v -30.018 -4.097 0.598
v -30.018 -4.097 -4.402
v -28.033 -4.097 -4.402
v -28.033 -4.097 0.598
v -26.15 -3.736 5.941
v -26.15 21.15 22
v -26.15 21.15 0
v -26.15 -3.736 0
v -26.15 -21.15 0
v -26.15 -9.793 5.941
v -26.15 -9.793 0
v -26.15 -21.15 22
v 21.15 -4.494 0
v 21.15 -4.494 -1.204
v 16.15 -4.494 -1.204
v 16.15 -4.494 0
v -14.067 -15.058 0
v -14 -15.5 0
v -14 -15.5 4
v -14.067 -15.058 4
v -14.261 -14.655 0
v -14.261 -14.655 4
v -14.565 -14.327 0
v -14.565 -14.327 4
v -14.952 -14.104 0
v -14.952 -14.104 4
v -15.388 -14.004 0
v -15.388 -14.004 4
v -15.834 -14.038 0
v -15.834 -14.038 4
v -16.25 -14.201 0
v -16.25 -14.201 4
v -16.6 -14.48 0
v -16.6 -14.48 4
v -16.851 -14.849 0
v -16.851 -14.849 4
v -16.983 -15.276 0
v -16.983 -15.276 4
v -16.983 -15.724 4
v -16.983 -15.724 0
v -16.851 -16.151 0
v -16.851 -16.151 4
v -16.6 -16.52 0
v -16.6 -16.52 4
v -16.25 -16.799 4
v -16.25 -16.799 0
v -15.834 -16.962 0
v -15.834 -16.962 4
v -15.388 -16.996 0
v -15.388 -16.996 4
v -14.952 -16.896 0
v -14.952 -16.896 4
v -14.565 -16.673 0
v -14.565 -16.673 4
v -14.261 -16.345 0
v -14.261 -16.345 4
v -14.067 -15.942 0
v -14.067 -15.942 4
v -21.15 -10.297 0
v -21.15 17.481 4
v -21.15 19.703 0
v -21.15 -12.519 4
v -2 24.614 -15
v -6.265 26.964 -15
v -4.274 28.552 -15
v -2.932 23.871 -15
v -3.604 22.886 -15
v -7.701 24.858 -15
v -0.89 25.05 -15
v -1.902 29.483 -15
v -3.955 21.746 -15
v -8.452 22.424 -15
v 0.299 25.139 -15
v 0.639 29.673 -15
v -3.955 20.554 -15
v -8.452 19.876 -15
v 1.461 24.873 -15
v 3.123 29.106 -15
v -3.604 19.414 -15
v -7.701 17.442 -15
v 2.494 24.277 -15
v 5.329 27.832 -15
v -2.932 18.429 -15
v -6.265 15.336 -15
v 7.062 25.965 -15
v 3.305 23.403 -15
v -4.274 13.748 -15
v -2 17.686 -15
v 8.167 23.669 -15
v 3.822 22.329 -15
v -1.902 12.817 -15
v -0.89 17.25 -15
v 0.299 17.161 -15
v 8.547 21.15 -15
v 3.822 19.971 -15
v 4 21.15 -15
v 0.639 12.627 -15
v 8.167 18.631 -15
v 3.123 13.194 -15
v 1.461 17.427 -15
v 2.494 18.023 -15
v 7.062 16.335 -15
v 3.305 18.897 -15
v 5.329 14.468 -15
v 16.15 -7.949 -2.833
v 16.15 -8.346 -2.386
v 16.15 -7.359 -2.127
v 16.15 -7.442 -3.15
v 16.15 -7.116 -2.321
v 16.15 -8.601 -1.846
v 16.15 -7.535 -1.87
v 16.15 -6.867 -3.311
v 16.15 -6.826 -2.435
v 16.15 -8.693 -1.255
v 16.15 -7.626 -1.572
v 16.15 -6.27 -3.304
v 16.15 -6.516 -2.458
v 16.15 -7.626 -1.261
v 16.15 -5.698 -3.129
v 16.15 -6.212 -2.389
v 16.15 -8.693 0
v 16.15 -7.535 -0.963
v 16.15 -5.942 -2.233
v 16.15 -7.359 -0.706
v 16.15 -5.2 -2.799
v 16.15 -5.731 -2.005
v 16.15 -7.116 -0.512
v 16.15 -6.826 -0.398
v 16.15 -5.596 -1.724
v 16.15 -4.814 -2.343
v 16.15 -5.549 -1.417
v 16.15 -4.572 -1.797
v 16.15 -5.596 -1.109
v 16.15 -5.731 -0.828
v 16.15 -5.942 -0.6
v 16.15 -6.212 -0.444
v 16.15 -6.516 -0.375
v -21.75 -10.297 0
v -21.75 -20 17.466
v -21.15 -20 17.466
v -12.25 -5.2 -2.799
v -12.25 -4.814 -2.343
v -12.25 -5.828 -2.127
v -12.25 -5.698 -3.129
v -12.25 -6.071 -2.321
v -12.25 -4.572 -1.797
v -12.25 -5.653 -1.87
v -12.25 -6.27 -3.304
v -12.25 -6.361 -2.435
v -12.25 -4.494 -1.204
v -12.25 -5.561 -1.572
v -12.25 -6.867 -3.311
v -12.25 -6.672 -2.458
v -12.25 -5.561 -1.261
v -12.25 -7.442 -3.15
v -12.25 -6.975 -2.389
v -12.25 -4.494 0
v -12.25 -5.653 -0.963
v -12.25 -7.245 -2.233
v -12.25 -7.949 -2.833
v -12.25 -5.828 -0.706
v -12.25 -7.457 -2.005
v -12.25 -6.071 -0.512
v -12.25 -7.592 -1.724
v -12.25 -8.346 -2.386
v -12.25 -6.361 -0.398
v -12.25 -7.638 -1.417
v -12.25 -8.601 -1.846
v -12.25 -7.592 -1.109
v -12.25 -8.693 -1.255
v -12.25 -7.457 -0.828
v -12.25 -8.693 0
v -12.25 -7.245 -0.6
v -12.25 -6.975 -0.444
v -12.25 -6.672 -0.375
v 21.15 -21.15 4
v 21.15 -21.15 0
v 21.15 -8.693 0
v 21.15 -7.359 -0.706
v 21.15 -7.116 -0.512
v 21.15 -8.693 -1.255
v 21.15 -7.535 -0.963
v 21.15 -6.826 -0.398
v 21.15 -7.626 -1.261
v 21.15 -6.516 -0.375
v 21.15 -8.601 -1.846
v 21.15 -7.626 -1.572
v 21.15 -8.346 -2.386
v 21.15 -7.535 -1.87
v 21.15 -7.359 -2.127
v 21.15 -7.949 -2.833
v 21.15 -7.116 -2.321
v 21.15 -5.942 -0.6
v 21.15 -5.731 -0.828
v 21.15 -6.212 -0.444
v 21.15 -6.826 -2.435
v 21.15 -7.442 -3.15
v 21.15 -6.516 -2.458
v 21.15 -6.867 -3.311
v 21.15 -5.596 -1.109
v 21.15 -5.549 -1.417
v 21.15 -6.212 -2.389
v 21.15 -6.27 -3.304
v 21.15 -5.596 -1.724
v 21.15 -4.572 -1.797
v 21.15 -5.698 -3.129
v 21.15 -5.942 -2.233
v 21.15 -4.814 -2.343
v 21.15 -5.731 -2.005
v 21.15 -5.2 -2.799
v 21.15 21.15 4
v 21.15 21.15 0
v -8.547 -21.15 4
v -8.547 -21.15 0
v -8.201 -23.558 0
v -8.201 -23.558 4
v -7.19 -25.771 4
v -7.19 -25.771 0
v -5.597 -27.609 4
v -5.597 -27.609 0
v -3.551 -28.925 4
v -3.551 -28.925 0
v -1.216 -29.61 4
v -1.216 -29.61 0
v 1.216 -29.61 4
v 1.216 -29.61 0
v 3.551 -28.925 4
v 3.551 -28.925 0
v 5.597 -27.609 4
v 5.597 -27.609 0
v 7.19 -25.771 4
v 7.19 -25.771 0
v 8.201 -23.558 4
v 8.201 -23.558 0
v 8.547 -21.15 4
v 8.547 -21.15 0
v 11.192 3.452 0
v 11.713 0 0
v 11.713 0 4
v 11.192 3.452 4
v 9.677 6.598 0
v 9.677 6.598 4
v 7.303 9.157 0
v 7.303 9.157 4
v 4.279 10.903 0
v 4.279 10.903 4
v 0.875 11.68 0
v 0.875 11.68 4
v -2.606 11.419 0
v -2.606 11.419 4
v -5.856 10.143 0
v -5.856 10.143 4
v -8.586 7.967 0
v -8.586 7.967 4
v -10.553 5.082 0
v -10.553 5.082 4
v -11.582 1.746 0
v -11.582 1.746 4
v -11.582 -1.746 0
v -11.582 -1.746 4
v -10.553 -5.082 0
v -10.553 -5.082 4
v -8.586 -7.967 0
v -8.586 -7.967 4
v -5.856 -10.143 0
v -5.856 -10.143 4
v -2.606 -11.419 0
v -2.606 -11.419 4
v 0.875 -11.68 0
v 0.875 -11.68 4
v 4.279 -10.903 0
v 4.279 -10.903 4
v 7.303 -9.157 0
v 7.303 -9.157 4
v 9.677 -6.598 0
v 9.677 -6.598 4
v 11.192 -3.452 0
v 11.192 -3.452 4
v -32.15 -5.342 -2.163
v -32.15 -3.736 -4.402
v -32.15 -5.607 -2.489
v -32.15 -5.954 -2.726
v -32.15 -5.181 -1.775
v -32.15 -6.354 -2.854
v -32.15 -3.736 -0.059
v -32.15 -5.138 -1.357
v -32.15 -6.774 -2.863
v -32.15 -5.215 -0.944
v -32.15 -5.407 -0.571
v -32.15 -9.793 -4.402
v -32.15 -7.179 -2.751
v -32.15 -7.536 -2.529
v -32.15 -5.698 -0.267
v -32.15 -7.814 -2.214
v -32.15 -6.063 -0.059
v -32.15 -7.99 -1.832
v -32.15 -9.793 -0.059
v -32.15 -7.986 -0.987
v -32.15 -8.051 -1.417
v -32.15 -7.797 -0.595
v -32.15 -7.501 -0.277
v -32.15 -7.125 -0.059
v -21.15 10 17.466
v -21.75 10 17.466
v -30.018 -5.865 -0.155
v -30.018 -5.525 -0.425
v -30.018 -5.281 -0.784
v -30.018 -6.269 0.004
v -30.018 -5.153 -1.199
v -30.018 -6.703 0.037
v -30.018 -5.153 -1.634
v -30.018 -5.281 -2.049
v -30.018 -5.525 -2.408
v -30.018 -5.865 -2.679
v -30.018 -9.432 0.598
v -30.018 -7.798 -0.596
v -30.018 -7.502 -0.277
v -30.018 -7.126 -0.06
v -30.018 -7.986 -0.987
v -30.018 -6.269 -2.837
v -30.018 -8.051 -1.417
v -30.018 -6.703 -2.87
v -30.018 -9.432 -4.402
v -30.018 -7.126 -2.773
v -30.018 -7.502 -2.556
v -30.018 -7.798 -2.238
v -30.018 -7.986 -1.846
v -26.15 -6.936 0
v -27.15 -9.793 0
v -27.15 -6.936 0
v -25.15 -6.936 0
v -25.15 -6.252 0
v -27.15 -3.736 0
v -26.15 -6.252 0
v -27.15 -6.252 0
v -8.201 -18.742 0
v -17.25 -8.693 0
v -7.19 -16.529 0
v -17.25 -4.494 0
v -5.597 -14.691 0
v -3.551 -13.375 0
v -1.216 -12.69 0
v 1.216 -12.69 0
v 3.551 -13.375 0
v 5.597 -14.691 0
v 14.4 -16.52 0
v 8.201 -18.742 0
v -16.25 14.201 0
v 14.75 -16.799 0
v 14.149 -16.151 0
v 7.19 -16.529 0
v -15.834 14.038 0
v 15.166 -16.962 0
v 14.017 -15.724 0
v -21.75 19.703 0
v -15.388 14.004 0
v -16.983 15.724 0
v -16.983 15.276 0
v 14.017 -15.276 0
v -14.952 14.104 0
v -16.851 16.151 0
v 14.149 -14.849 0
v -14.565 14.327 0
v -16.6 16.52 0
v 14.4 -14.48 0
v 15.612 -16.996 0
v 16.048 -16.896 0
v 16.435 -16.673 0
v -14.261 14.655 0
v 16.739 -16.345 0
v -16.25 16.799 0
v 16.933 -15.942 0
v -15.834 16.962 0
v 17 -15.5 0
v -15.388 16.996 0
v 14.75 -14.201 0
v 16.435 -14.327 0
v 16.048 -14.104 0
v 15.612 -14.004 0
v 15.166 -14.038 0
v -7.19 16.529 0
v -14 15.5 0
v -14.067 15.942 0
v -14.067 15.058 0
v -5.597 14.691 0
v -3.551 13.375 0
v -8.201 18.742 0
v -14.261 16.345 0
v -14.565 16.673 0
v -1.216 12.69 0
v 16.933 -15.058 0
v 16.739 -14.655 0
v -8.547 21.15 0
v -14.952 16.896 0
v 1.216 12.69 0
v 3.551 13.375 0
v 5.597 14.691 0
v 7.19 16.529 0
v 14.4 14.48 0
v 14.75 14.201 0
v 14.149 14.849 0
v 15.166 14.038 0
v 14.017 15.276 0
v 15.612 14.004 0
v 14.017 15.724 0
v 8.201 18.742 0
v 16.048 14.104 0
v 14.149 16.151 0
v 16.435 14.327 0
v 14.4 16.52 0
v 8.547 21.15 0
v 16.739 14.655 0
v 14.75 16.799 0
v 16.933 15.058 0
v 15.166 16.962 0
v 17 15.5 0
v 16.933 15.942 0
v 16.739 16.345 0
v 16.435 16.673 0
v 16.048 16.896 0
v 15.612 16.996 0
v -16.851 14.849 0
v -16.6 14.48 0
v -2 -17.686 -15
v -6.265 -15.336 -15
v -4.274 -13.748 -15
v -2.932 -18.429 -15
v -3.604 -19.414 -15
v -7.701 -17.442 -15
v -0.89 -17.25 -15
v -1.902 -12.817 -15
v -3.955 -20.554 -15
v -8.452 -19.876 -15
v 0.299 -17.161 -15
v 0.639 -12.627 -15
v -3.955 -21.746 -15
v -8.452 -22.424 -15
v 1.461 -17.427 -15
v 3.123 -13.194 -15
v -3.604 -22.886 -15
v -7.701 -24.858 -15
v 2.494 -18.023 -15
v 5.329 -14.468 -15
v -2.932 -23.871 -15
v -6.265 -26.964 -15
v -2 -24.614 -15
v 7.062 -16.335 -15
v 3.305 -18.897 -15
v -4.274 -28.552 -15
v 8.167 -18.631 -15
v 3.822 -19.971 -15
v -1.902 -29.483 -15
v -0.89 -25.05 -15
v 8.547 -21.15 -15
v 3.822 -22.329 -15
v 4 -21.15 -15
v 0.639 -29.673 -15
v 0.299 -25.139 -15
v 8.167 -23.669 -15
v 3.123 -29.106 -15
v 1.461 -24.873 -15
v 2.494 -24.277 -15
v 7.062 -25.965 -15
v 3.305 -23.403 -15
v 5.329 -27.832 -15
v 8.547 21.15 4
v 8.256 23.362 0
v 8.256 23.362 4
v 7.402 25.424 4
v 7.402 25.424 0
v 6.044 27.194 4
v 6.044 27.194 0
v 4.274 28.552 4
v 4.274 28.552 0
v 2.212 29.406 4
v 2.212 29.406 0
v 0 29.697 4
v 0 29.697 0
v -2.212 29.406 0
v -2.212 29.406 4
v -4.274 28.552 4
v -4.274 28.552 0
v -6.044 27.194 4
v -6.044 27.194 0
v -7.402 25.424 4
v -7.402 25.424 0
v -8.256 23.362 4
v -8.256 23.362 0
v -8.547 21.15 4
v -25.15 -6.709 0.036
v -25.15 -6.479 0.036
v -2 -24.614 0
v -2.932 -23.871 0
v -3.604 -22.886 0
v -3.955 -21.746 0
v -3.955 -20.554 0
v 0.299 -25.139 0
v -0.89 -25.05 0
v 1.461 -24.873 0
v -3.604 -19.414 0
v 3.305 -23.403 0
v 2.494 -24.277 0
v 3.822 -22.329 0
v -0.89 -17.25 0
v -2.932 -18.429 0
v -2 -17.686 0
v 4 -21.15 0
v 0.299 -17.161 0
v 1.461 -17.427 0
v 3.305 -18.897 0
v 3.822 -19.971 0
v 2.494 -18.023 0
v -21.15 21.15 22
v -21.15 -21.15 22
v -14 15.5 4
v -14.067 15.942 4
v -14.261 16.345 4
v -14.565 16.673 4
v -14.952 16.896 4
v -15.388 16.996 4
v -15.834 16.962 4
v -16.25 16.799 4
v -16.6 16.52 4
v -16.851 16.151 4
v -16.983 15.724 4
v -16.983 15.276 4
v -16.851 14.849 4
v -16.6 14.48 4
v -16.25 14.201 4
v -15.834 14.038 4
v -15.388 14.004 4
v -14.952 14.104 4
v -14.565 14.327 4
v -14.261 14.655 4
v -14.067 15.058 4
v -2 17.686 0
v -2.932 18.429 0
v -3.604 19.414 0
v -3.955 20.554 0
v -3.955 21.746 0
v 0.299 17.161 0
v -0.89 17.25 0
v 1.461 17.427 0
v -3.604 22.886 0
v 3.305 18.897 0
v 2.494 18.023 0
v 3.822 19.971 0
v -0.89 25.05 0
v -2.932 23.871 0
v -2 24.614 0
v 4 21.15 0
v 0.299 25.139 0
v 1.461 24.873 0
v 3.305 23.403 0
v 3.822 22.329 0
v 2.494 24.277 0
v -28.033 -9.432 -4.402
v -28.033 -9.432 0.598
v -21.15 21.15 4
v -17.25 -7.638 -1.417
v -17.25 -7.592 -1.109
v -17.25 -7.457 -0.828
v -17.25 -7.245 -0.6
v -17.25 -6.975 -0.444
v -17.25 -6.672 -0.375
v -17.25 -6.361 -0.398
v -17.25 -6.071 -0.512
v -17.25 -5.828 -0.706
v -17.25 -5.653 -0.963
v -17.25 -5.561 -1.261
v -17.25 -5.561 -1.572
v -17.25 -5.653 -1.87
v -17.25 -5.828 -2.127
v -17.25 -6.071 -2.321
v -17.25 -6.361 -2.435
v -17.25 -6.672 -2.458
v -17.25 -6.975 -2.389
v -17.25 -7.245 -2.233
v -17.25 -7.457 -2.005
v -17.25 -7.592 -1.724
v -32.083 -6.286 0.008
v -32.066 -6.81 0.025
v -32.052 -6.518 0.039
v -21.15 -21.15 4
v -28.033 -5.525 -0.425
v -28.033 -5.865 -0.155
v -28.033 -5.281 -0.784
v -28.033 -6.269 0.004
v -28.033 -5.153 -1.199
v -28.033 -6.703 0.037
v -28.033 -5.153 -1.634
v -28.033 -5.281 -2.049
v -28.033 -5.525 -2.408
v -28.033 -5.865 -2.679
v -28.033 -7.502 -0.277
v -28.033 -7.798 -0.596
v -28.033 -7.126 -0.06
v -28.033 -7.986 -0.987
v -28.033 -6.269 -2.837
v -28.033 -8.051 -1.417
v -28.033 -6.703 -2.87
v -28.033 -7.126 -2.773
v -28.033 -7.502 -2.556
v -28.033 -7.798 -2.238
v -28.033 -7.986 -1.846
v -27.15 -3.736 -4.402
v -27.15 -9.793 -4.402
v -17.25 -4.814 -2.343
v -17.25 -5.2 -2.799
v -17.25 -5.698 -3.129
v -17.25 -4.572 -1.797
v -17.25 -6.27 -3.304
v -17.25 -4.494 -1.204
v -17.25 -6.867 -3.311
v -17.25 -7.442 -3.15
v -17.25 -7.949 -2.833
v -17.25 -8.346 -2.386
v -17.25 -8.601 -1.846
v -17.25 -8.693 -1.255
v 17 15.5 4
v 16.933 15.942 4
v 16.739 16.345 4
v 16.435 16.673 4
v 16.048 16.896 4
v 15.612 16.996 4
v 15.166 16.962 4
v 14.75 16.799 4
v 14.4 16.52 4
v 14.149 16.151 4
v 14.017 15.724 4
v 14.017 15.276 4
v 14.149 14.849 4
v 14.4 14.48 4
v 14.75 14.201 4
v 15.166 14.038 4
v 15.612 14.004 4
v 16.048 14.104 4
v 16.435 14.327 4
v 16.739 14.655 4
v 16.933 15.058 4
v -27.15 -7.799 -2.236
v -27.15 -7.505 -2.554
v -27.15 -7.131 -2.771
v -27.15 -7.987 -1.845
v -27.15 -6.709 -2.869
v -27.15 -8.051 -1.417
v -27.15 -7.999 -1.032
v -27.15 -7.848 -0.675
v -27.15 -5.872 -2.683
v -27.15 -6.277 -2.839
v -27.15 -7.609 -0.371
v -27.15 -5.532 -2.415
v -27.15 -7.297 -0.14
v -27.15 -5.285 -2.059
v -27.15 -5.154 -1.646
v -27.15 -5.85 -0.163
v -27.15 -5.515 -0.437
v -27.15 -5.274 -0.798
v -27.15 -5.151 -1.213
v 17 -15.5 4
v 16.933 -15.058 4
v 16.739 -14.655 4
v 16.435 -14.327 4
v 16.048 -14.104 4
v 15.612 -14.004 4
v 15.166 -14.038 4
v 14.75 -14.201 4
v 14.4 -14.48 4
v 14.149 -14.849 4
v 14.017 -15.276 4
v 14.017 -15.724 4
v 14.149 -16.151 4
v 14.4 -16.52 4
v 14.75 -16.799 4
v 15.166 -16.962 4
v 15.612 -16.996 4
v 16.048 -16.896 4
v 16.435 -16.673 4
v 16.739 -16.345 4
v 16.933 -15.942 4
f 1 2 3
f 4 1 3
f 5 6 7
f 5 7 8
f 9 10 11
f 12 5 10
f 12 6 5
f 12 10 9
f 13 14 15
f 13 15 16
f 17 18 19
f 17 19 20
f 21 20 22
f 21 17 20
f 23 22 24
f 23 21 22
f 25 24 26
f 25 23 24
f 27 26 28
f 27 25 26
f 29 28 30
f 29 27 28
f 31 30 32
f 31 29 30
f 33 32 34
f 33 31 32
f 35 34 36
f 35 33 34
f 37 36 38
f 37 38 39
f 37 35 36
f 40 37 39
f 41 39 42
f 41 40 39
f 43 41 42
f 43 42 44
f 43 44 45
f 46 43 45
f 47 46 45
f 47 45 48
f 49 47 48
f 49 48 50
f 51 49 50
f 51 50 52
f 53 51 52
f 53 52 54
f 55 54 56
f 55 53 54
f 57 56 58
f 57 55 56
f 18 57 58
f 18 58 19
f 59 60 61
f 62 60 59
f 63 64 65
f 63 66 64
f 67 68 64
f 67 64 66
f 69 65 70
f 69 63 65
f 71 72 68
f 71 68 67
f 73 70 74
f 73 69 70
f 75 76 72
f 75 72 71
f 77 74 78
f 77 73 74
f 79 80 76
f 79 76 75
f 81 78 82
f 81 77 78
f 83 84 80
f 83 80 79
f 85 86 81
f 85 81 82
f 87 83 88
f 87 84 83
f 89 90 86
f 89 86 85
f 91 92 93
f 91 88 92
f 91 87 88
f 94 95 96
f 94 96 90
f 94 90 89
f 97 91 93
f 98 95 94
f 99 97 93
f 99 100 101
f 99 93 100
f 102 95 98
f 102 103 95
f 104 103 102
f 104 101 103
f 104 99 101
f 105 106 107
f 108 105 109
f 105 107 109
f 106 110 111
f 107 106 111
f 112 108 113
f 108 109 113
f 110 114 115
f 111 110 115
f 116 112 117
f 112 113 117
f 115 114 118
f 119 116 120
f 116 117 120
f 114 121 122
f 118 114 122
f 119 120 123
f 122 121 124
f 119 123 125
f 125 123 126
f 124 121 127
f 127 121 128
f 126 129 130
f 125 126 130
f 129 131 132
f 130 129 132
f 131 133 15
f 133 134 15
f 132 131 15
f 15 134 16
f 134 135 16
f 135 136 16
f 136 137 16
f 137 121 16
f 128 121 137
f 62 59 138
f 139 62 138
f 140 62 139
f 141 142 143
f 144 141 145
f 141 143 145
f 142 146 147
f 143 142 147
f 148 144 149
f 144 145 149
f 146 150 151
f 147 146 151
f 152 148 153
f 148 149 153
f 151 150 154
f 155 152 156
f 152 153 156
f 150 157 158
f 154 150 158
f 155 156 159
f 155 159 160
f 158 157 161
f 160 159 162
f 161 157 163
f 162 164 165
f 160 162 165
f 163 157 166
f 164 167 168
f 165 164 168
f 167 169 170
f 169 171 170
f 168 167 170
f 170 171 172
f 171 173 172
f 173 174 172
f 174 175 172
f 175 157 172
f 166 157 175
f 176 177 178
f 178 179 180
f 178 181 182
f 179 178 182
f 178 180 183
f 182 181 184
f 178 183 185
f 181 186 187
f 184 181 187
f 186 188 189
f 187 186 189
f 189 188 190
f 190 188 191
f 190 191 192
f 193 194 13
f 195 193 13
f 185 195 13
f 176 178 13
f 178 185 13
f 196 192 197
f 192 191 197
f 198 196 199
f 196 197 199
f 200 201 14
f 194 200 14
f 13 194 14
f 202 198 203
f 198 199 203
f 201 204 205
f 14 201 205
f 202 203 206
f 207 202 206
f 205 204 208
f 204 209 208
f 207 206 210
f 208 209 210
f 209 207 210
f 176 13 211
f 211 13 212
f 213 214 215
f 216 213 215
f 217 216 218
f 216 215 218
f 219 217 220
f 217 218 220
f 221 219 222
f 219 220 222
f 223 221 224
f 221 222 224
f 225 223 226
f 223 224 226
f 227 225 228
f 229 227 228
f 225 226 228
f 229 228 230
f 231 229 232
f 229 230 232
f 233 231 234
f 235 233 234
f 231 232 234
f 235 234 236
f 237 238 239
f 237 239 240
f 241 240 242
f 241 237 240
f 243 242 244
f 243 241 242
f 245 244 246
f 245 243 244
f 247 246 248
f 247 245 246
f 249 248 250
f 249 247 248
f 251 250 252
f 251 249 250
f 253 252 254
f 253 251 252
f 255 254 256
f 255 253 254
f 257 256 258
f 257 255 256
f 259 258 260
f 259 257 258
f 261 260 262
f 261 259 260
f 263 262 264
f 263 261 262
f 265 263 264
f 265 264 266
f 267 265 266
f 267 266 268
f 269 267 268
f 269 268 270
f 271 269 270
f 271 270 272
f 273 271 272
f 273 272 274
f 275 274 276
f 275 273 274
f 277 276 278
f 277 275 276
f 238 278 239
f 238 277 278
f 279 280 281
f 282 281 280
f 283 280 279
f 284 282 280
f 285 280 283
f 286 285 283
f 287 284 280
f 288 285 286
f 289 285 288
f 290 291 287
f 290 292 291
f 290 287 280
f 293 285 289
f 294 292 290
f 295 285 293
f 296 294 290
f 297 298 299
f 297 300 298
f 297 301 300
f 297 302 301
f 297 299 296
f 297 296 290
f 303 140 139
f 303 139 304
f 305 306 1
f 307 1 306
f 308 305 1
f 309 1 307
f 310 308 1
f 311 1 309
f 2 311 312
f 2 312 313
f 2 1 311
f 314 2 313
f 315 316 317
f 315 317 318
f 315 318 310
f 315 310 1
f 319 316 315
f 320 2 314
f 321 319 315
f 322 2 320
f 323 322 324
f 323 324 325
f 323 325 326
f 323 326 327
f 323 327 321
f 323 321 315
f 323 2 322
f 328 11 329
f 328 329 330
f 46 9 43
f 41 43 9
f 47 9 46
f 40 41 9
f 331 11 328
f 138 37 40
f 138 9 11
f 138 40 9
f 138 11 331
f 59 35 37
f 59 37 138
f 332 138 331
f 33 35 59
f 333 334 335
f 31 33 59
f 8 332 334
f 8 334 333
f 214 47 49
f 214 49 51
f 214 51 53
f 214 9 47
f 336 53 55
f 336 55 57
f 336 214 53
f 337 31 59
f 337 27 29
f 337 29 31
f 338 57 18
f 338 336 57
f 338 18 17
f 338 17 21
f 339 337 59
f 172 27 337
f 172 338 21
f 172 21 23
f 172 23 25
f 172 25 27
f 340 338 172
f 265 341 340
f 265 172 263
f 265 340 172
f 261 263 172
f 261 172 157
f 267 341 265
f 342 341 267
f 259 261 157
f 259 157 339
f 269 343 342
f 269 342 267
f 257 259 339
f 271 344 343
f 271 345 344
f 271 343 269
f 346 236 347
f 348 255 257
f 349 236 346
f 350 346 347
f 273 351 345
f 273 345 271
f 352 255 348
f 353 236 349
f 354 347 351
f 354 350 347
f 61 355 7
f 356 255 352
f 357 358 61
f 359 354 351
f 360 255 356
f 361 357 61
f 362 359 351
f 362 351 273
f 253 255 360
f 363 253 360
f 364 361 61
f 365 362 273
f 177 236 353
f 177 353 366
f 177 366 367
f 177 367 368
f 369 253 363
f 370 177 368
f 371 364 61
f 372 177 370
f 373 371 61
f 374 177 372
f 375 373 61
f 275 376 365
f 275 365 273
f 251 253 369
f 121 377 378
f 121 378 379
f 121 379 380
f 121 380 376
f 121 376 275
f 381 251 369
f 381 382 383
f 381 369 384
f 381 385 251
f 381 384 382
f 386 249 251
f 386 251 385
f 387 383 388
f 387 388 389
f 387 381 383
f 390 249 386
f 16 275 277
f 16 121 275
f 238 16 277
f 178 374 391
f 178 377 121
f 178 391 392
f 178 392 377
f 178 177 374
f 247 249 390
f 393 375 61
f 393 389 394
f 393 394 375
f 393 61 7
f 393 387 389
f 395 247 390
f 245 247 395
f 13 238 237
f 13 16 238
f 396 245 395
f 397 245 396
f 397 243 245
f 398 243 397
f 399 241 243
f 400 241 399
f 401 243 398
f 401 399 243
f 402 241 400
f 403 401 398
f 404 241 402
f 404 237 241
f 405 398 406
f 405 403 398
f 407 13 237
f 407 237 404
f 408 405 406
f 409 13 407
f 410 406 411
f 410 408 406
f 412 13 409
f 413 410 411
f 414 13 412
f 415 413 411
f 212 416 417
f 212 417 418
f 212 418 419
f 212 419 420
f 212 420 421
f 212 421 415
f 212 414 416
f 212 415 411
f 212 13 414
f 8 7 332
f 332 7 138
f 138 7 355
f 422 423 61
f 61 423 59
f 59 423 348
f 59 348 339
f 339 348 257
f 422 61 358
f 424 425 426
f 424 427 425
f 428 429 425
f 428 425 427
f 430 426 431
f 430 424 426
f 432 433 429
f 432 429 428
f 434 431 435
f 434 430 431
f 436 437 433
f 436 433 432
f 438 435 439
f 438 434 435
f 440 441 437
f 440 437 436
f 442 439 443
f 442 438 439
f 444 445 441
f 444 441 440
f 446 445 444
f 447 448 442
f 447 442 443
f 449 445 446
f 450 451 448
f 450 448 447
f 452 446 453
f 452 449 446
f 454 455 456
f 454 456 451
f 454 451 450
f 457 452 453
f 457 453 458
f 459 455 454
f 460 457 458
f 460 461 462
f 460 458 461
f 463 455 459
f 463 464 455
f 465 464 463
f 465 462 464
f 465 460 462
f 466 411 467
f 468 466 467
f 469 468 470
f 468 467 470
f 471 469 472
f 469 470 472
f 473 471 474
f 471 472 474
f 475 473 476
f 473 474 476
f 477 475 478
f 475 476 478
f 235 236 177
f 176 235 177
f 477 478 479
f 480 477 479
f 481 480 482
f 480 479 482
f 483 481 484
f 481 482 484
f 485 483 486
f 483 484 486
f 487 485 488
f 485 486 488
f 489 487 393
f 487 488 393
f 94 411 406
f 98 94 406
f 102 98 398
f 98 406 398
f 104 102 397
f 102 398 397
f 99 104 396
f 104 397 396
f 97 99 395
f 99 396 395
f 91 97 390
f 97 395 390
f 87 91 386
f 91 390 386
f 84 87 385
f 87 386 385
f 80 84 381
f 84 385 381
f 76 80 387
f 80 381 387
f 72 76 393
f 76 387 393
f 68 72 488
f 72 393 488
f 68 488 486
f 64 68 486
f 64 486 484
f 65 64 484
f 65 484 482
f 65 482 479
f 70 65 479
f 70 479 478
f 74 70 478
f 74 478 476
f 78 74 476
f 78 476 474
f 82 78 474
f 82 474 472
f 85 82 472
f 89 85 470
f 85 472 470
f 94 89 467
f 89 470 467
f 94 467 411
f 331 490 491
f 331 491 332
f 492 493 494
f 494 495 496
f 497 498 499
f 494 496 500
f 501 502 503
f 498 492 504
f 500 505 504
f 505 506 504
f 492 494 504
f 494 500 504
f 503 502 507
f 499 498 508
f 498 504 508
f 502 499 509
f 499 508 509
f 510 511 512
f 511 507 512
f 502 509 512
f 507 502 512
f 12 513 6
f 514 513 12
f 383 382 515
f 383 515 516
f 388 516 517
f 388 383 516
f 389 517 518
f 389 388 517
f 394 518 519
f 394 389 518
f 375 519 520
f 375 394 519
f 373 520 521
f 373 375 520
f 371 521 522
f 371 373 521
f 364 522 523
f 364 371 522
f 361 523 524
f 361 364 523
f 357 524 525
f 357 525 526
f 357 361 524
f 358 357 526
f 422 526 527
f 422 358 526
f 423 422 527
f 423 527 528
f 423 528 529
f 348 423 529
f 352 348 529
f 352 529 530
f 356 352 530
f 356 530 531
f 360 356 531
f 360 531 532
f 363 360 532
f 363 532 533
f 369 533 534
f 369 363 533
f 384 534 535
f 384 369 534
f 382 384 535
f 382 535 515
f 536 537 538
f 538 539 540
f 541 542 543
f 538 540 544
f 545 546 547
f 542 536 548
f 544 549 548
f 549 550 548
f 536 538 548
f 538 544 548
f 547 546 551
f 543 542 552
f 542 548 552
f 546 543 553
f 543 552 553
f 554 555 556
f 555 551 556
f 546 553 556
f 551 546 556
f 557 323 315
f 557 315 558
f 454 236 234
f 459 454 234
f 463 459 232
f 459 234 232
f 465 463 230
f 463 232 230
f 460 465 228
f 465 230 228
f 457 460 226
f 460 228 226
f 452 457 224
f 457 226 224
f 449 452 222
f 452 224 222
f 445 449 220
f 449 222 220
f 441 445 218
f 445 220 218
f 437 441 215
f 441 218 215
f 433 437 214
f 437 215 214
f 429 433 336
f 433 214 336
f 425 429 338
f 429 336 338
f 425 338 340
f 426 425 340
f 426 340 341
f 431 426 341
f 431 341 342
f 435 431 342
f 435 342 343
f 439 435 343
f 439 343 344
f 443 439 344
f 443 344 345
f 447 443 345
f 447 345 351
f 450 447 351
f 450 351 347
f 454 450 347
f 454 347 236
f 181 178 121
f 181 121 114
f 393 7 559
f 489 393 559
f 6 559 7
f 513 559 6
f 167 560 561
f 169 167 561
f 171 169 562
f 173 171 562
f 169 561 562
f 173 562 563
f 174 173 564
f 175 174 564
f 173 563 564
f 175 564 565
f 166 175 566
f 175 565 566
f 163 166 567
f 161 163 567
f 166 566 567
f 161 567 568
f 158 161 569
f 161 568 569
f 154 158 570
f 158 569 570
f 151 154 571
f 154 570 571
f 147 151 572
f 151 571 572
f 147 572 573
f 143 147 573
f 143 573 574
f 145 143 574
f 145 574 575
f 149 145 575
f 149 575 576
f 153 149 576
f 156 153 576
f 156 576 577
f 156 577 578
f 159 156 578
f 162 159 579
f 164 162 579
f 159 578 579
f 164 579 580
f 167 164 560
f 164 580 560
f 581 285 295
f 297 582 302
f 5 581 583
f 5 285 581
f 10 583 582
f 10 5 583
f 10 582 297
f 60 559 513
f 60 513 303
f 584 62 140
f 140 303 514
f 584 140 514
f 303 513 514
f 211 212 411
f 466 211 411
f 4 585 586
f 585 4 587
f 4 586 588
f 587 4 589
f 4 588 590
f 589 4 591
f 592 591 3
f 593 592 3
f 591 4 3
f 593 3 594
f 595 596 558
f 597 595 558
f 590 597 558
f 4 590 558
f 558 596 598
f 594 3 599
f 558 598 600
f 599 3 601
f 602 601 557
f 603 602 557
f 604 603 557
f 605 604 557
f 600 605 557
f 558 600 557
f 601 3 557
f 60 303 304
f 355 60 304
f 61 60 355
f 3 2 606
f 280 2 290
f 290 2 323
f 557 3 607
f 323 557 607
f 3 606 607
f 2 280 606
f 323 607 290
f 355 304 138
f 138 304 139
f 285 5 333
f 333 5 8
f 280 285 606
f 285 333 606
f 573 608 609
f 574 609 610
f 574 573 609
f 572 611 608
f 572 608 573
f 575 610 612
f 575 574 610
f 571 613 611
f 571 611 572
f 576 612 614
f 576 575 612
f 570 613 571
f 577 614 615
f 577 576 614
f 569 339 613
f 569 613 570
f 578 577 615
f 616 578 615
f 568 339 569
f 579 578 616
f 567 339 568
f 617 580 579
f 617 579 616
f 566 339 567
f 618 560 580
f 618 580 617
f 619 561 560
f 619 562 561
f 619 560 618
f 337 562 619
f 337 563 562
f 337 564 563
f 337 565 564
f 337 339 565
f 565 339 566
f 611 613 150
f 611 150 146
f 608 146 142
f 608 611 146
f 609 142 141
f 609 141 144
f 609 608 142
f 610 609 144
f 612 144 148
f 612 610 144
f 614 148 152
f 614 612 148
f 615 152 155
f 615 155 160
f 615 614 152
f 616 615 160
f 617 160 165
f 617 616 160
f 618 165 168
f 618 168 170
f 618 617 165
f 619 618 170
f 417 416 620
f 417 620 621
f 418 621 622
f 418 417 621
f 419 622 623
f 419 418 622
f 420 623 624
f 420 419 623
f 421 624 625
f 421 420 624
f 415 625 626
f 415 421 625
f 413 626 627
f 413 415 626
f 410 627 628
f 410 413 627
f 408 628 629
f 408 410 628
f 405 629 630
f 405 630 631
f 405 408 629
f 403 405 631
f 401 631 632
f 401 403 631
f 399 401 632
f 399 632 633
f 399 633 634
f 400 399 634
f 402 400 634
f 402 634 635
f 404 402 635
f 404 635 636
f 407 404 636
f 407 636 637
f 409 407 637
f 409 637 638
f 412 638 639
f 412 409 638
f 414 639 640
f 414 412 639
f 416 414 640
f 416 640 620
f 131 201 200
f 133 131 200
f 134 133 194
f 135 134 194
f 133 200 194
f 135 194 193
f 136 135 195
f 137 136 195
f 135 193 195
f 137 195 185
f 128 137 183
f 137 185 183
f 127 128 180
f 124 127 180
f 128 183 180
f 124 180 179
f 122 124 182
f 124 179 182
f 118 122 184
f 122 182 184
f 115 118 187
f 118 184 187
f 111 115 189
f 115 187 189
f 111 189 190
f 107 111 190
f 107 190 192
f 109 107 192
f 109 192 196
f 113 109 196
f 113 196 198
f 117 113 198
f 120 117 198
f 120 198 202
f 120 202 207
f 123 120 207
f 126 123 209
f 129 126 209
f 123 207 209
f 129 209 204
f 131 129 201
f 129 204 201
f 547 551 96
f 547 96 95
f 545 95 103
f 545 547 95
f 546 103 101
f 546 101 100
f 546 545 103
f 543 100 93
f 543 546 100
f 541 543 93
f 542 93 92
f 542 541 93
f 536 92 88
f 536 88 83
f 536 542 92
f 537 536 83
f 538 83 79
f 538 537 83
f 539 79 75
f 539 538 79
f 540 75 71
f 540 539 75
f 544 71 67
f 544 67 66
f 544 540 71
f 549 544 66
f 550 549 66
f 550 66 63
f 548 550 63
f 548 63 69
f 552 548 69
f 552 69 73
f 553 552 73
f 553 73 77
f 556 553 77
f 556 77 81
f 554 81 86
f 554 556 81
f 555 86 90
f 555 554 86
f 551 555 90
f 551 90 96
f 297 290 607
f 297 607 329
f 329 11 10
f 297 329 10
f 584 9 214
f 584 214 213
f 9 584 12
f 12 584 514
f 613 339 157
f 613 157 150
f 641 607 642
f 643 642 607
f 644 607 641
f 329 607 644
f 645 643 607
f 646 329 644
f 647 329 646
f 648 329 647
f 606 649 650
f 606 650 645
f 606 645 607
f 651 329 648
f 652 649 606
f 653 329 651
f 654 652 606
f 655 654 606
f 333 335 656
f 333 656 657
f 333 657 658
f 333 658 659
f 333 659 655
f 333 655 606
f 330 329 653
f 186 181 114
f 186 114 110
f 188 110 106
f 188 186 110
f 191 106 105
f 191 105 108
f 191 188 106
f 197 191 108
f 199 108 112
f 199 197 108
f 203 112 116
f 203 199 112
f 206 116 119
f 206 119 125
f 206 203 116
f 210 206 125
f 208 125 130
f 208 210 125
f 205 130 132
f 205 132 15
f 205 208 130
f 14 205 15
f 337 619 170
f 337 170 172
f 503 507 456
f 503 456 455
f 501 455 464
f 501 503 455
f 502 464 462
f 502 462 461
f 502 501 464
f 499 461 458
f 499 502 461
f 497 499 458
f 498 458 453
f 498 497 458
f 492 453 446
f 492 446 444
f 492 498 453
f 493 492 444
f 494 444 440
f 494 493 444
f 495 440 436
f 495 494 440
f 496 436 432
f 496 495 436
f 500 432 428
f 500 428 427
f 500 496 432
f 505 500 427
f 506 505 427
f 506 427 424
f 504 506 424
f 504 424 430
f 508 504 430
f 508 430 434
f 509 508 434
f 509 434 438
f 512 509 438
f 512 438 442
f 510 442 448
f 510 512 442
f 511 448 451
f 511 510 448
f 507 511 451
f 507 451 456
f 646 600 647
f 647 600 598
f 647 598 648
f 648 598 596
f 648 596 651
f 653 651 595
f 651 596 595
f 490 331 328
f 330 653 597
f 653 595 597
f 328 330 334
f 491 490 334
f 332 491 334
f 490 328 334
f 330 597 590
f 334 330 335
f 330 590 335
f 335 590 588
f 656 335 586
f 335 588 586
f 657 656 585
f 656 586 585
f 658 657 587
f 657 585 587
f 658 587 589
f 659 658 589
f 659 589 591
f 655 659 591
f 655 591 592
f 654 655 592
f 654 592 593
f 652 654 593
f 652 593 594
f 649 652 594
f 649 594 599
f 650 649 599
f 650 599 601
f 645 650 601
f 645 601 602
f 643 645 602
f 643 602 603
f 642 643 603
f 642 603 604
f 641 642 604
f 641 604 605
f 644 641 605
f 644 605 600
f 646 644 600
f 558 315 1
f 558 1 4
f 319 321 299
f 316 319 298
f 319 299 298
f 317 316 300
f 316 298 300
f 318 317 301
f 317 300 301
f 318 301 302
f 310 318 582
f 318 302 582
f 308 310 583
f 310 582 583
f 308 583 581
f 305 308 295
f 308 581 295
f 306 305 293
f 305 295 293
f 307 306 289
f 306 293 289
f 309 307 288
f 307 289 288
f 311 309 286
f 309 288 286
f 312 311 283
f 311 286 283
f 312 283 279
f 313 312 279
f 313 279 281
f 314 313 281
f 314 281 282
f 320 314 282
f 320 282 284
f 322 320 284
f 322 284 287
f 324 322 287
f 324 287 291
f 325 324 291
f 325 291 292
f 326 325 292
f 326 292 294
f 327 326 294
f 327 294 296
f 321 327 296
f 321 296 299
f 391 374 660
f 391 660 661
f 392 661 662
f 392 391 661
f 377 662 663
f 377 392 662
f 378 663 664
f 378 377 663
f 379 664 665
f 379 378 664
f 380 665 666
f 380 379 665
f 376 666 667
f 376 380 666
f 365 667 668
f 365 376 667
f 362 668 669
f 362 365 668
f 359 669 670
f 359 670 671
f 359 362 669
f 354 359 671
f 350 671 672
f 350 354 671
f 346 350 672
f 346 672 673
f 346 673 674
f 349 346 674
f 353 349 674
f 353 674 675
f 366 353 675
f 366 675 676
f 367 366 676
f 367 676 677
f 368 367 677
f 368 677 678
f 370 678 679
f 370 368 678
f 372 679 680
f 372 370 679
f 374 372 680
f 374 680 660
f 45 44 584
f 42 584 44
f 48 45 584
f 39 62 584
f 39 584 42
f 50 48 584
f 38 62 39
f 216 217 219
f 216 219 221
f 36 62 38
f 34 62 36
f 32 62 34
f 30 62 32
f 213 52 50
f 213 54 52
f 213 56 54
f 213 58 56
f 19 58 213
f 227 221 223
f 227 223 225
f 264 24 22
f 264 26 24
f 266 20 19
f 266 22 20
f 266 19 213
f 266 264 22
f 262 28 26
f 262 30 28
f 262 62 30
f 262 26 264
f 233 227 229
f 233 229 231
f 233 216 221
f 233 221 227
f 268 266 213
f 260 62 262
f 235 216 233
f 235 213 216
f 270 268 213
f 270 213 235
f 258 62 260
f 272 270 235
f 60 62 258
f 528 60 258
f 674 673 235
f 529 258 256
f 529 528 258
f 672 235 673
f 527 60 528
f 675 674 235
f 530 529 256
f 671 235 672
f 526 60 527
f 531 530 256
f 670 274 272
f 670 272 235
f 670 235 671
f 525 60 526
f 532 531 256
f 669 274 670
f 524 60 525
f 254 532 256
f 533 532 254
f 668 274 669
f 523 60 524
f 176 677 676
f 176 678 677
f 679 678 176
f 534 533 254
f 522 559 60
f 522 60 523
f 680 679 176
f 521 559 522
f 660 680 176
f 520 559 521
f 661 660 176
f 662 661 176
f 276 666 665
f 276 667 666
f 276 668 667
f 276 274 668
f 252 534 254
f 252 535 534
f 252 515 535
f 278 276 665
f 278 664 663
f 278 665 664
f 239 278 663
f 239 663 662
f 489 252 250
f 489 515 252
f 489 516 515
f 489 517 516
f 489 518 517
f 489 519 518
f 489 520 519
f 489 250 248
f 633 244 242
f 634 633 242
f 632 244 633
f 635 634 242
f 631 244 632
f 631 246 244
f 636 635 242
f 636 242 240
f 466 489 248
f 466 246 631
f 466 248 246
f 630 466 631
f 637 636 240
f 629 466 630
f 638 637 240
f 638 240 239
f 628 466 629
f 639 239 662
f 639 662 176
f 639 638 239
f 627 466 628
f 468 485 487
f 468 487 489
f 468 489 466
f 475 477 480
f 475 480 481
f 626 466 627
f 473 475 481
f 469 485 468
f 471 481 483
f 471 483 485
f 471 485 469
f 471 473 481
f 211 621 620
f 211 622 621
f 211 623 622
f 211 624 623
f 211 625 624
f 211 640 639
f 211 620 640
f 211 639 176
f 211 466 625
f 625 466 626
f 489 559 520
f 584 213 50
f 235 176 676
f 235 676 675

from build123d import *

# Parameters (mm, degrees)
F0_R      = 1.5
F0_R_2    = 11.7126871306
F1_DEPTH  = 4
F2_R      = 4
F3_DEPTH  = 15
F6_DEPTH  = 0.6
F7_W      = 42.3
F7_H      = 22
F8_DEPTH  = 5
F11_R     = 1.0444740365
F12_DEPTH = 5
F14_R     = 1.0444740365
F15_DEPTH = 5
F16_W     = 6.0576063115
F16_H     = 10.3428596631
F16_R     = 1.0444740365
F17_DEPTH = 6
F18_SIZE  = 5.99999
F19_R     = 1.4573614865
F20_DEPTH = 7
F21_W     = 1.9849594682
F21_H     = 5.3345812485
F22_DEPTH = 5
F23_W     = 6.0576063115
F23_H     = 5.2529345267
F24_DEPTH = 1


# Not quite as in the source:
# - a fillet or chamfer is up to 0.001 mm smaller than in the source, because OpenCascade refuses the exact size


with BuildPart() as f1:
    # F0 (on Top) → F1 (new body)
    with BuildSketch(Plane.XY):
        with BuildLine():
            Line((21.15, -21.15), (21.15, 21.15))
            Line((21.15, 21.15), (8.5471369535, 21.15))
            ThreePointArc((8.5471369535, 21.15), (6.0437384995, 27.1937384995), (0, 29.6971369535))
            ThreePointArc((0, 29.6971369535), (-6.0437384995, 27.1937384995), (-8.5471369535, 21.15))
            Line((-8.5471369535, 21.15), (-21.15, 21.15))
            Line((-21.15, 21.15), (-21.15, -21.15))
            Line((-21.15, -21.15), (-8.5471369535, -21.15))
            ThreePointArc((-8.5471369535, -21.15), (0, -29.6971369535), (8.5471369535, -21.15))
            Line((8.5471369535, -21.15), (21.15, -21.15))
        make_face()
        with Locations((-15.5, -15.5)):
            Circle(F0_R, mode=Mode.SUBTRACT)
        with Locations((15.5, -15.5)):
            Circle(F0_R, mode=Mode.SUBTRACT)
        with Locations((-15.5, 15.5)):
            Circle(F0_R, mode=Mode.SUBTRACT)
        Circle(F0_R_2, mode=Mode.SUBTRACT)
        with Locations((15.5, 15.5)):
            Circle(F0_R, mode=Mode.SUBTRACT)
    extrude(amount=F1_DEPTH)

    # F2 (on face) → F3 (join)
    with BuildSketch(Plane(origin=(0, 0, 0), x_dir=(1, 0, 0), z_dir=(0, 0, -1))):
        with BuildLine():
            ThreePointArc((-8.5471369535, 21.15), (0, 12.6028630465), (8.5471369535, 21.15))
            ThreePointArc((8.5471369535, 21.15), (0, 29.6971369535), (-8.5471369535, 21.15))
        make_face()
        with Locations((0, 21.15)):
            Circle(F2_R, mode=Mode.SUBTRACT)
        with BuildLine():
            ThreePointArc((-8.5471369535, -21.15), (0, -29.6971369535), (8.5471369535, -21.15))
            ThreePointArc((8.5471369535, -21.15), (0, -12.6028630465), (-8.5471369535, -21.15))
        make_face()
        with Locations((0, -21.15)):
            Circle(F2_R, mode=Mode.SUBTRACT)
    extrude(amount=F3_DEPTH)

    # F7 (on face) → F8 (join)
    with BuildSketch(Plane(origin=(-21.15, 0, 0), x_dir=(0, -1, 0), z_dir=(-1, 0, 0))):
        with Locations((0, 11)):
            Rectangle(F7_W, F7_H)
    extrude(amount=F8_DEPTH)

    # F9: union 


with BuildPart() as f6:
    # F5 (on offset) → F6 (new body)
    with BuildSketch(Plane(origin=(-21.15, 0, 0), x_dir=(0, -1, 0), z_dir=(-1, 0, 0))):
        Polygon((-10, 17.4662213922), (-20, -0.5337786078), (10, -0.5337786078), (20, 17.4662213922), align=None)
    extrude(amount=F6_DEPTH)


with BuildPart() as f1_1:
    add(f1.part)

    # F10: cut F6
    add(f6.part, mode=Mode.SUBTRACT)

    # F11 (on face) → F12 (join)
    with BuildSketch(Plane.YZ.offset(21.15)):
        with BuildLine():
            Line((-4.4944686815, -1.2040658621), (-4.4944686815, 0))
            Line((-4.4944686815, 0), (-8.6928773671, 0))
            Line((-8.6928773671, 0), (-8.6928773671, -1.2551693944))
            ThreePointArc((-8.6928773671, -1.2551693944), (-6.5681212582, -3.3288219711), (-4.4944686815, -1.2040658621))
        make_face()
        with Locations((-6.5936730243, -1.4166244073)):
            Circle(F11_R, mode=Mode.SUBTRACT)
    extrude(amount=-F12_DEPTH)

    # F14 (on offset) → F15 (join)
    with BuildSketch(Plane(origin=(-17.25, 0, 0), x_dir=(0, -1, 0), z_dir=(-1, 0, 0))):
        with BuildLine():
            Line((8.6928773671, -1.2551693944), (8.6928773671, 0))
            Line((8.6928773671, 0), (4.4944686815, 0))
            Line((4.4944686815, 0), (4.4944686815, -1.2040658621))
            ThreePointArc((4.4944686815, -1.2040658621), (6.5681212582, -3.3288219711), (8.6928773671, -1.2551693944))
        make_face()
        with Locations((6.5936730243, -1.4166244073)):
            Circle(F14_R, mode=Mode.SUBTRACT)
    extrude(amount=-F15_DEPTH)

    # F16 (on face) → F17 (join)
    with BuildSketch(Plane(origin=(-26.15, 0, 0), x_dir=(0, -1, 0), z_dir=(-1, 0, 0))):
        with Locations((6.7643582588, 0.7691108622)):
            Rectangle(F16_W, F16_H)
        with BuildLine():
            ThreePointArc((8.6928773671, -1.2551693944), (6.5681212582, -3.3288219711), (4.4944686815, -1.2040658621))
            Line((4.4944686815, -1.2040658621), (4.4944686815, 0))
            Line((4.4944686815, 0), (8.6928773671, 0))
            Line((8.6928773671, 0), (8.6928773671, -1.2551693944))
        make_face(mode=Mode.SUBTRACT)
        with BuildLine():
            ThreePointArc((8.6928773671, -1.2551693944), (6.5681212582, -3.3288219711), (4.4944686815, -1.2040658621))
            Line((4.4944686815, -1.2040658621), (4.4944686815, 0))
            Line((4.4944686815, 0), (3.735555103, 0))
            Line((3.735555103, 0), (3.735555103, -4.4023189694))
            Line((3.735555103, -4.4023189694), (9.7931614146, -4.4023189694))
            Line((9.7931614146, -4.4023189694), (9.7931614146, 0))
            Line((9.7931614146, 0), (8.6928773671, 0))
            Line((8.6928773671, 0), (8.6928773671, -1.2551693944))
        make_face()
        with BuildLine():
            Line((4.4944686815, 0), (4.4944686815, -1.2040658621))
            ThreePointArc((4.4944686815, -1.2040658621), (6.5681212582, -3.3288219711), (8.6928773671, -1.2551693944))
            Line((8.6928773671, -1.2551693944), (8.6928773671, 0))
            Line((8.6928773671, 0), (4.4944686815, 0))
        make_face()
        with Locations((6.5936730243, -1.4166244073)):
            Circle(F16_R, mode=Mode.SUBTRACT)
    extrude(amount=F17_DEPTH)

    # F18 (size 6 in the source; OpenCascade refuses exactly that, so slightly less here)
    f18_edges = [f1_1.edges().sort_by_distance(p)[0] for p in [
        (-32.15, -6.764358, 5.940541),
    ]]
    chamfer(f18_edges, length=F18_SIZE)

    # F19 (on face) → F20 (cut)
    with BuildSketch(Plane(origin=(-32.15, 0, 0), x_dir=(0, -1, 0), z_dir=(-1, 0, 0))):
        with Locations((6.5936730243, -1.4166244073)):
            Circle(F19_R)
    extrude(amount=-F20_DEPTH, mode=Mode.SUBTRACT)

    # F21 (on face) → F22 (cut)
    with BuildSketch(Plane(origin=(0, 0, -4.4023189694), x_dir=(1, 0, 0), z_dir=(0, 0, -1))):
        with Locations((-29.0259411559, 6.7643583752)):
            Rectangle(F21_W, F21_H)
    extrude(amount=-F22_DEPTH, mode=Mode.SUBTRACT)

    # F23 (on face) → F24 (cut)
    with BuildSketch(Plane.YZ.offset(-26.15)):
        with Locations((-6.7643582588, -2.6264672633)):
            Rectangle(F23_W, F23_H)
    extrude(amount=-F24_DEPTH, mode=Mode.SUBTRACT)


solid = f1_1.part
